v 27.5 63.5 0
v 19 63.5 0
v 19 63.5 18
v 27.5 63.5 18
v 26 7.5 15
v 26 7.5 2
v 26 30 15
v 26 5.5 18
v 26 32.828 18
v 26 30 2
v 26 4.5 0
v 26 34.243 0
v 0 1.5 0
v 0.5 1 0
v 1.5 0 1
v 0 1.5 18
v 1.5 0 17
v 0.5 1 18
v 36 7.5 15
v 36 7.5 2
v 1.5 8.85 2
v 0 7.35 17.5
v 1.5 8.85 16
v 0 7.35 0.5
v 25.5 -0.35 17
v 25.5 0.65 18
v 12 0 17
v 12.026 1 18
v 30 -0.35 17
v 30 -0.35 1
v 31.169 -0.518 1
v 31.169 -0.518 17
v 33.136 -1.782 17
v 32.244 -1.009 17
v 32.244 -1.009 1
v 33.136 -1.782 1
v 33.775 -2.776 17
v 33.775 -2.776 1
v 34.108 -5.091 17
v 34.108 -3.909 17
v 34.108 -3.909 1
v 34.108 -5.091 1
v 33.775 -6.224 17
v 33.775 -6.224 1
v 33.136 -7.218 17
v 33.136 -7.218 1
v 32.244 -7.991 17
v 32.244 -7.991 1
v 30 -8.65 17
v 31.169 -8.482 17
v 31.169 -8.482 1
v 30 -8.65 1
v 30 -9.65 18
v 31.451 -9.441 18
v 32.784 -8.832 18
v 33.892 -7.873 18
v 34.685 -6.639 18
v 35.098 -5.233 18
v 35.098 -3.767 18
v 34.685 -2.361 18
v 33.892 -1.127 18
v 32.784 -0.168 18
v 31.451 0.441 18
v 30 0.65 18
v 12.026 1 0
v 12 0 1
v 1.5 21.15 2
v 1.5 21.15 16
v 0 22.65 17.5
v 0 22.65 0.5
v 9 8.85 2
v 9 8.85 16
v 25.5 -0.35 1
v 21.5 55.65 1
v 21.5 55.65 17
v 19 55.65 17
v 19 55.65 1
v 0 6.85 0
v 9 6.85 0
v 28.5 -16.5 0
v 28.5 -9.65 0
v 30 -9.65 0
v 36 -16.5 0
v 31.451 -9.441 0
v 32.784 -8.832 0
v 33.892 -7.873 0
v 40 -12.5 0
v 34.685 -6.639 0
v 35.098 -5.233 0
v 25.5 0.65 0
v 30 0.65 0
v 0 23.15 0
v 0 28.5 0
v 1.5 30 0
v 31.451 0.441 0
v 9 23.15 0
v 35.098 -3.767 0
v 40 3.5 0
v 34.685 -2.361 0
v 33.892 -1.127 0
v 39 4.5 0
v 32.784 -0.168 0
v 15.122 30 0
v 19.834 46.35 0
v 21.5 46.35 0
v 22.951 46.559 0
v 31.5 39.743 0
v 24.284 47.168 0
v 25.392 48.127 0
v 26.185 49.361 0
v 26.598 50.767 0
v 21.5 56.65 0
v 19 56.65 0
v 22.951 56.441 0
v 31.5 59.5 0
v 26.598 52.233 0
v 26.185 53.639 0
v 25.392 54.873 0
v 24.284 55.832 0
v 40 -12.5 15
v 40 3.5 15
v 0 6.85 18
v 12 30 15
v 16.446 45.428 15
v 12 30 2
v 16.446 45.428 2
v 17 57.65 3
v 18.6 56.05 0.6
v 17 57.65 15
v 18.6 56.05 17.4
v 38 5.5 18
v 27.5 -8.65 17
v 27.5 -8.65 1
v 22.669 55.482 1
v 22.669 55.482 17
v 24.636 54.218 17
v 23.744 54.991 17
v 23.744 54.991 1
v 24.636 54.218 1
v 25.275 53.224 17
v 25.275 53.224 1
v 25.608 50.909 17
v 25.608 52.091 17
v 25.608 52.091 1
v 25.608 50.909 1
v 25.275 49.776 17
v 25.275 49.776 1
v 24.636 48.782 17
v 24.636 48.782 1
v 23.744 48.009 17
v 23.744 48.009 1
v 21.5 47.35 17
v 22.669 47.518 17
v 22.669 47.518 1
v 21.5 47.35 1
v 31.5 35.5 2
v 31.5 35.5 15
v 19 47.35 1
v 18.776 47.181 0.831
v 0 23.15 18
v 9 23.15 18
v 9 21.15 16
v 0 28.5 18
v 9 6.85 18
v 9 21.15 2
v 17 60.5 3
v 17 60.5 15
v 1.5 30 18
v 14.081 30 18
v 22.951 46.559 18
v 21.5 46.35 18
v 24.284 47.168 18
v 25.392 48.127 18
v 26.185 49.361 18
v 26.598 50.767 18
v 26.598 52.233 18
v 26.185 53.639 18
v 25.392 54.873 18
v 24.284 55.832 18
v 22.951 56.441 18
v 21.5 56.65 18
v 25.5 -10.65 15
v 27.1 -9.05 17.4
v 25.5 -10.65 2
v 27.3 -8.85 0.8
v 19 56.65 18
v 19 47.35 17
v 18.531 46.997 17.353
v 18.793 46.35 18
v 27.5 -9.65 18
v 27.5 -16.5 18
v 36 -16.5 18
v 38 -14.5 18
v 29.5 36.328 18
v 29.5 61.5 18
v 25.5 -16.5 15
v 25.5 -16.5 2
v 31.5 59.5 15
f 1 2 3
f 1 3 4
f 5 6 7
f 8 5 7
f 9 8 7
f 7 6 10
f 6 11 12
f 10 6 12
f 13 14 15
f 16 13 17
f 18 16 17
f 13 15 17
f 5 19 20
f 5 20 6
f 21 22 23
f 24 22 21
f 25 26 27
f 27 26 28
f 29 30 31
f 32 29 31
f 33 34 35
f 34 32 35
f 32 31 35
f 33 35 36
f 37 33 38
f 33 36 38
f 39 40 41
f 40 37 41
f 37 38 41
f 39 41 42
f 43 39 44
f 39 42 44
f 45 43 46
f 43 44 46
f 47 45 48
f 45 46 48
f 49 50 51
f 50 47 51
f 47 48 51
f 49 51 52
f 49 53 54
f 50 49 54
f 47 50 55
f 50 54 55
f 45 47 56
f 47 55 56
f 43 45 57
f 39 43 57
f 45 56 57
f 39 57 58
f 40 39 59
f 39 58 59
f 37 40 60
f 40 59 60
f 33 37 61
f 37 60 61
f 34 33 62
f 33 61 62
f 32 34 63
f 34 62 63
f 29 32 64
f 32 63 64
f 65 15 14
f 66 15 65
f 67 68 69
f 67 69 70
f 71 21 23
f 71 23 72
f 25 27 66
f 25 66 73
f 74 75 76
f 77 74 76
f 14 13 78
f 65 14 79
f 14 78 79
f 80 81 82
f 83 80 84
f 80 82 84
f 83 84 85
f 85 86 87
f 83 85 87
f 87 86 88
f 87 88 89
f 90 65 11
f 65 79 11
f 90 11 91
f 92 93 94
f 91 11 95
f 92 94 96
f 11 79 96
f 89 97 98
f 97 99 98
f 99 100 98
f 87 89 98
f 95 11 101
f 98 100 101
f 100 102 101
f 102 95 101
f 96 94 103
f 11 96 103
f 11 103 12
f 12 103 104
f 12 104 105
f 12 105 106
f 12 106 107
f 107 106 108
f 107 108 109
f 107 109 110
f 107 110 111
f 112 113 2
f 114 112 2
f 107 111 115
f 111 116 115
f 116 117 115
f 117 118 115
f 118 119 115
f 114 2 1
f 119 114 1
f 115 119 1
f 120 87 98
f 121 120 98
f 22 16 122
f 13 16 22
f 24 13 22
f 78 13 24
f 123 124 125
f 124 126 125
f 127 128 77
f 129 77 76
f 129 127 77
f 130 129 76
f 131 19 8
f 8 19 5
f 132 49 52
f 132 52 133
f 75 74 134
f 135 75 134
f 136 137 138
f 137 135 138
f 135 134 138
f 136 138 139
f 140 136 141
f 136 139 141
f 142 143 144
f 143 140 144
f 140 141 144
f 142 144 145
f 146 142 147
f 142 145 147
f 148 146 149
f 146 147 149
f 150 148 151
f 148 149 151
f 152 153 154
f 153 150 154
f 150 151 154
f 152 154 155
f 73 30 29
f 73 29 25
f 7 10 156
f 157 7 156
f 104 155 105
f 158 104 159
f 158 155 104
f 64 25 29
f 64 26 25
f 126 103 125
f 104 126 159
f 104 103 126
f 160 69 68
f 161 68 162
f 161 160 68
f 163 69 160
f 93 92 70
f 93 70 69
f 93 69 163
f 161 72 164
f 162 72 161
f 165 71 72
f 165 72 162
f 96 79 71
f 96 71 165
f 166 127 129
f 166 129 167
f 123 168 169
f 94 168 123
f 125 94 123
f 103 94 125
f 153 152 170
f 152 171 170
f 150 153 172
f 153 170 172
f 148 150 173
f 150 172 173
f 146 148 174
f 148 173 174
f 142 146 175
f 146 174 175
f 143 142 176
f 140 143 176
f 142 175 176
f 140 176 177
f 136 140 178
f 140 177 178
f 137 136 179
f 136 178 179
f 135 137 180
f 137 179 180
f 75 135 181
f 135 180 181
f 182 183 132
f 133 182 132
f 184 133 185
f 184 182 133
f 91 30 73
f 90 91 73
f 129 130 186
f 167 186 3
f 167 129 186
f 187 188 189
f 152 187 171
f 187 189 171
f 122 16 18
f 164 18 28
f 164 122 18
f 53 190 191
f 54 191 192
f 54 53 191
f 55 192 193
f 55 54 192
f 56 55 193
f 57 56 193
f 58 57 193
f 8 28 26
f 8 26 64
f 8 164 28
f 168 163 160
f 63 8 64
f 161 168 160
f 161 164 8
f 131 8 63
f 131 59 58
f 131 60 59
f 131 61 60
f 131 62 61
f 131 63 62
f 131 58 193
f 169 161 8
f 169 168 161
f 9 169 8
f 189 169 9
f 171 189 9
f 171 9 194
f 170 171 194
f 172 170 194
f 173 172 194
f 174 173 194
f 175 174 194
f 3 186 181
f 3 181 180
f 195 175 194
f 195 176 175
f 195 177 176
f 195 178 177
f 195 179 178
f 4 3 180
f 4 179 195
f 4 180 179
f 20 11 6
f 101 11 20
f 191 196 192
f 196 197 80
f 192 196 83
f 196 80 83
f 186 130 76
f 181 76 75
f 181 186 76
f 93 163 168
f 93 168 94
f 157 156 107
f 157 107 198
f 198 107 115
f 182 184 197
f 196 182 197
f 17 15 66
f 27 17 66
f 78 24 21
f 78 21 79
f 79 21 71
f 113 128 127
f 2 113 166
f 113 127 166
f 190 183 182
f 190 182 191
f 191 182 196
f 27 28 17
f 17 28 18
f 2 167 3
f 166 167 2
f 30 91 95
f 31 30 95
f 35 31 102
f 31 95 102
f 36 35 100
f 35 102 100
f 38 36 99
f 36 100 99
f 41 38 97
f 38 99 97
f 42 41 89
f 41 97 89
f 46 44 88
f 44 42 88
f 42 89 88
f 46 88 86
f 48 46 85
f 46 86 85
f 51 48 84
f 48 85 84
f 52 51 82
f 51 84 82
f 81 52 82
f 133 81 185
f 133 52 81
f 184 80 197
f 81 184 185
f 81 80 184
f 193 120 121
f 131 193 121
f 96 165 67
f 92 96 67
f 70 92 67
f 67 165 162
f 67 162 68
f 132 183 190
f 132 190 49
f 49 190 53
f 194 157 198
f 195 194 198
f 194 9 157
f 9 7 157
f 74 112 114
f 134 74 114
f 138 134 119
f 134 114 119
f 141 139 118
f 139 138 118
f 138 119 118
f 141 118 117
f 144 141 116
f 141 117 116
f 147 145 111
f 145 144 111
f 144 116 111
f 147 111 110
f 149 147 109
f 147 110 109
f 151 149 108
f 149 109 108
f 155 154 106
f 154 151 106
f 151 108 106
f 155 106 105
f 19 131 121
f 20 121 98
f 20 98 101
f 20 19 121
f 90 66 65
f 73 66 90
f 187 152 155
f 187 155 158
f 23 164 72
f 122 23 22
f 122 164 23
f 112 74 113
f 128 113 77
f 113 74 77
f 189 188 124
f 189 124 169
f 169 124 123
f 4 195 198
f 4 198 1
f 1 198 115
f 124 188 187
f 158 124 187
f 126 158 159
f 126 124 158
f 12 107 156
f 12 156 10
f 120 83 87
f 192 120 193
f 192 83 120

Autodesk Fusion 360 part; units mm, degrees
sketch "Sketch1" plane through (0, 0, 0) normal (0, 0, 1) x (1, 0, 0)
  line L0 (0, 0) -> (0, 8.85)
  line L1 (0, 8.85) -> (9, 8.85)
  line L2 (9, 8.85) -> (9, 21.15)
  line L3 (9, 21.15) -> (0, 21.15)
  line L4 (0, 21.15) -> (0, 30)
  line L5 (0, 0) -> (12, 0)
  line L6 (26, 30) -> (31.5, 35.5)
  line L7 (31.5, 35.5) -> (31.5, 63.5)
  line L8 (0, 30) -> (12, 30)
  line L9 (21.5, 47.35) -> (21.5, 55.65) construction
  line L10 (17, 63.5) -> (31.5, 63.5)
  arc A0 (21.5, 47.35) -> (21.5, 55.65) centre (21.5, 51.5) ccw
  line L11 (21.5, 47.35) -> (17, 47.35)
  line L12 (17, 47.35) -> (12, 30)
  line L13 (21.5, 55.65) -> (17, 55.65)
  line L14 (17, 55.65) -> (17, 63.5)
  line L15 (30, -8.65) -> (30, -0.35) construction
  line L16 (30, -0.35) -> (25.5, -0.35)
  line L17 (30, -8.65) -> (25.5, -8.65)
  arc A1 (30, -8.65) -> (30, -0.35) centre (30, -4.5) ccw
  line L18 (12, 0) -> (25.5, -0.35)
  line L19 (25.5, -8.65) -> (25.5, -16.5)
  line L20 (25.5, -16.5) -> (40, -16.5)
  line L21 (40, -16.5) -> (40, 7.5)
  line L22 (40, 7.5) -> (26, 7.5)
  line L23 (26, 7.5) -> (26, 30)
  dimension "d3" = 9
  dimension "d4" = 12.3
  dimension "d6" = 30
  dimension "d7" = 21.5
  dimension "d8" = 51.5
  dimension "d10" = 8.3
  dimension "d13" = 17
  dimension "d14" = 10
  dimension "d15" = 12
  dimension "d20" = 12
  dimension "d22" = 12
  dimension "d25" = 4.5
  dimension "d26" = 30
  dimension "d27" = 12
  dimension "d28" = 10
  dimension "d29" = 12
  dimension "d32" = 26
  dimension "d33" = 45
extrude "Extrude1" add sketch "Sketch1" along normal blind 18
chamfer "Chamfer1" distance 2 distance2 3 13 edges at (31.5, 49.5, 18) (28.75, 32.75, 18) (28.75, 32.75, 0) (17, 63.5, 9) (14.5, 38.675, 18) (14.5, 38.675, 0) (17, 59.575, 18) (17, 59.575, 0) (33, 7.5, 18) (40, -4.5, 18) (33, 7.5, 0) (25.5, -12.575, 18) (25.5, -12.575, 0) measured on face at (20.3333, 19.55, 18) measured on face at (20.3333, 19.55, 18) measured on face at (27.8333, 31.8333, 6) measured on face at (21.8333, 63.5, 6) measured on face at (20.3333, 19.55, 18) measured on face at (15.3333, 41.5667, 6) measured on face at (20.3333, 19.55, 18) measured on face at (20.3333, 19.55, 0) measured on face at (20.3333, 19.55, 18) measured on face at (20.3333, 19.55, 18) measured on face at (35.3333, 7.5, 12) measured on face at (20.3333, 19.55, 18) measured on face at (25.5, -13.8833, 12)
chamfer "Chamfer2" distance 4 angle 45 3 edges at (31.5, 63.5, 7.5) (40, -16.5, 7.5) (40, 7.5, 8.5)
chamfer "Chamfer3" distance 2 angle 45 3 edges at (17, 55.65, 9) (17, 47.35, 8.5) (25.5, -8.65, 8.5)
chamfer "Chamfer4" distance 1.5 angle 45 4 edges at (0, 21.15, 9) (0, 8.85, 9) (0, 30, 9) (0, 0, 9)
chamfer "Chamfer5" distance 2 angle 45 4 edges at (5.25, 21.15, 18) (5.25, 8.85, 18) (5.25, 21.15, 0) (5.25, 8.85, 0)
chamfer "Chamfer7" distance 1 angle 45 12 edges at (25.65, 51.5, 0) (20.25, 55.65, 0) (20.811, 47.35, 0) (25.65, 51.5, 18) (20.2907, 47.35, 18) (20.25, 55.65, 18) (34.15, -4.5, 18) (28.75, -8.65, 18) (27.75, -0.35, 18) (34.15, -4.5, 0) (27.75, -0.35, 0) (29.25, -8.65, 0)
